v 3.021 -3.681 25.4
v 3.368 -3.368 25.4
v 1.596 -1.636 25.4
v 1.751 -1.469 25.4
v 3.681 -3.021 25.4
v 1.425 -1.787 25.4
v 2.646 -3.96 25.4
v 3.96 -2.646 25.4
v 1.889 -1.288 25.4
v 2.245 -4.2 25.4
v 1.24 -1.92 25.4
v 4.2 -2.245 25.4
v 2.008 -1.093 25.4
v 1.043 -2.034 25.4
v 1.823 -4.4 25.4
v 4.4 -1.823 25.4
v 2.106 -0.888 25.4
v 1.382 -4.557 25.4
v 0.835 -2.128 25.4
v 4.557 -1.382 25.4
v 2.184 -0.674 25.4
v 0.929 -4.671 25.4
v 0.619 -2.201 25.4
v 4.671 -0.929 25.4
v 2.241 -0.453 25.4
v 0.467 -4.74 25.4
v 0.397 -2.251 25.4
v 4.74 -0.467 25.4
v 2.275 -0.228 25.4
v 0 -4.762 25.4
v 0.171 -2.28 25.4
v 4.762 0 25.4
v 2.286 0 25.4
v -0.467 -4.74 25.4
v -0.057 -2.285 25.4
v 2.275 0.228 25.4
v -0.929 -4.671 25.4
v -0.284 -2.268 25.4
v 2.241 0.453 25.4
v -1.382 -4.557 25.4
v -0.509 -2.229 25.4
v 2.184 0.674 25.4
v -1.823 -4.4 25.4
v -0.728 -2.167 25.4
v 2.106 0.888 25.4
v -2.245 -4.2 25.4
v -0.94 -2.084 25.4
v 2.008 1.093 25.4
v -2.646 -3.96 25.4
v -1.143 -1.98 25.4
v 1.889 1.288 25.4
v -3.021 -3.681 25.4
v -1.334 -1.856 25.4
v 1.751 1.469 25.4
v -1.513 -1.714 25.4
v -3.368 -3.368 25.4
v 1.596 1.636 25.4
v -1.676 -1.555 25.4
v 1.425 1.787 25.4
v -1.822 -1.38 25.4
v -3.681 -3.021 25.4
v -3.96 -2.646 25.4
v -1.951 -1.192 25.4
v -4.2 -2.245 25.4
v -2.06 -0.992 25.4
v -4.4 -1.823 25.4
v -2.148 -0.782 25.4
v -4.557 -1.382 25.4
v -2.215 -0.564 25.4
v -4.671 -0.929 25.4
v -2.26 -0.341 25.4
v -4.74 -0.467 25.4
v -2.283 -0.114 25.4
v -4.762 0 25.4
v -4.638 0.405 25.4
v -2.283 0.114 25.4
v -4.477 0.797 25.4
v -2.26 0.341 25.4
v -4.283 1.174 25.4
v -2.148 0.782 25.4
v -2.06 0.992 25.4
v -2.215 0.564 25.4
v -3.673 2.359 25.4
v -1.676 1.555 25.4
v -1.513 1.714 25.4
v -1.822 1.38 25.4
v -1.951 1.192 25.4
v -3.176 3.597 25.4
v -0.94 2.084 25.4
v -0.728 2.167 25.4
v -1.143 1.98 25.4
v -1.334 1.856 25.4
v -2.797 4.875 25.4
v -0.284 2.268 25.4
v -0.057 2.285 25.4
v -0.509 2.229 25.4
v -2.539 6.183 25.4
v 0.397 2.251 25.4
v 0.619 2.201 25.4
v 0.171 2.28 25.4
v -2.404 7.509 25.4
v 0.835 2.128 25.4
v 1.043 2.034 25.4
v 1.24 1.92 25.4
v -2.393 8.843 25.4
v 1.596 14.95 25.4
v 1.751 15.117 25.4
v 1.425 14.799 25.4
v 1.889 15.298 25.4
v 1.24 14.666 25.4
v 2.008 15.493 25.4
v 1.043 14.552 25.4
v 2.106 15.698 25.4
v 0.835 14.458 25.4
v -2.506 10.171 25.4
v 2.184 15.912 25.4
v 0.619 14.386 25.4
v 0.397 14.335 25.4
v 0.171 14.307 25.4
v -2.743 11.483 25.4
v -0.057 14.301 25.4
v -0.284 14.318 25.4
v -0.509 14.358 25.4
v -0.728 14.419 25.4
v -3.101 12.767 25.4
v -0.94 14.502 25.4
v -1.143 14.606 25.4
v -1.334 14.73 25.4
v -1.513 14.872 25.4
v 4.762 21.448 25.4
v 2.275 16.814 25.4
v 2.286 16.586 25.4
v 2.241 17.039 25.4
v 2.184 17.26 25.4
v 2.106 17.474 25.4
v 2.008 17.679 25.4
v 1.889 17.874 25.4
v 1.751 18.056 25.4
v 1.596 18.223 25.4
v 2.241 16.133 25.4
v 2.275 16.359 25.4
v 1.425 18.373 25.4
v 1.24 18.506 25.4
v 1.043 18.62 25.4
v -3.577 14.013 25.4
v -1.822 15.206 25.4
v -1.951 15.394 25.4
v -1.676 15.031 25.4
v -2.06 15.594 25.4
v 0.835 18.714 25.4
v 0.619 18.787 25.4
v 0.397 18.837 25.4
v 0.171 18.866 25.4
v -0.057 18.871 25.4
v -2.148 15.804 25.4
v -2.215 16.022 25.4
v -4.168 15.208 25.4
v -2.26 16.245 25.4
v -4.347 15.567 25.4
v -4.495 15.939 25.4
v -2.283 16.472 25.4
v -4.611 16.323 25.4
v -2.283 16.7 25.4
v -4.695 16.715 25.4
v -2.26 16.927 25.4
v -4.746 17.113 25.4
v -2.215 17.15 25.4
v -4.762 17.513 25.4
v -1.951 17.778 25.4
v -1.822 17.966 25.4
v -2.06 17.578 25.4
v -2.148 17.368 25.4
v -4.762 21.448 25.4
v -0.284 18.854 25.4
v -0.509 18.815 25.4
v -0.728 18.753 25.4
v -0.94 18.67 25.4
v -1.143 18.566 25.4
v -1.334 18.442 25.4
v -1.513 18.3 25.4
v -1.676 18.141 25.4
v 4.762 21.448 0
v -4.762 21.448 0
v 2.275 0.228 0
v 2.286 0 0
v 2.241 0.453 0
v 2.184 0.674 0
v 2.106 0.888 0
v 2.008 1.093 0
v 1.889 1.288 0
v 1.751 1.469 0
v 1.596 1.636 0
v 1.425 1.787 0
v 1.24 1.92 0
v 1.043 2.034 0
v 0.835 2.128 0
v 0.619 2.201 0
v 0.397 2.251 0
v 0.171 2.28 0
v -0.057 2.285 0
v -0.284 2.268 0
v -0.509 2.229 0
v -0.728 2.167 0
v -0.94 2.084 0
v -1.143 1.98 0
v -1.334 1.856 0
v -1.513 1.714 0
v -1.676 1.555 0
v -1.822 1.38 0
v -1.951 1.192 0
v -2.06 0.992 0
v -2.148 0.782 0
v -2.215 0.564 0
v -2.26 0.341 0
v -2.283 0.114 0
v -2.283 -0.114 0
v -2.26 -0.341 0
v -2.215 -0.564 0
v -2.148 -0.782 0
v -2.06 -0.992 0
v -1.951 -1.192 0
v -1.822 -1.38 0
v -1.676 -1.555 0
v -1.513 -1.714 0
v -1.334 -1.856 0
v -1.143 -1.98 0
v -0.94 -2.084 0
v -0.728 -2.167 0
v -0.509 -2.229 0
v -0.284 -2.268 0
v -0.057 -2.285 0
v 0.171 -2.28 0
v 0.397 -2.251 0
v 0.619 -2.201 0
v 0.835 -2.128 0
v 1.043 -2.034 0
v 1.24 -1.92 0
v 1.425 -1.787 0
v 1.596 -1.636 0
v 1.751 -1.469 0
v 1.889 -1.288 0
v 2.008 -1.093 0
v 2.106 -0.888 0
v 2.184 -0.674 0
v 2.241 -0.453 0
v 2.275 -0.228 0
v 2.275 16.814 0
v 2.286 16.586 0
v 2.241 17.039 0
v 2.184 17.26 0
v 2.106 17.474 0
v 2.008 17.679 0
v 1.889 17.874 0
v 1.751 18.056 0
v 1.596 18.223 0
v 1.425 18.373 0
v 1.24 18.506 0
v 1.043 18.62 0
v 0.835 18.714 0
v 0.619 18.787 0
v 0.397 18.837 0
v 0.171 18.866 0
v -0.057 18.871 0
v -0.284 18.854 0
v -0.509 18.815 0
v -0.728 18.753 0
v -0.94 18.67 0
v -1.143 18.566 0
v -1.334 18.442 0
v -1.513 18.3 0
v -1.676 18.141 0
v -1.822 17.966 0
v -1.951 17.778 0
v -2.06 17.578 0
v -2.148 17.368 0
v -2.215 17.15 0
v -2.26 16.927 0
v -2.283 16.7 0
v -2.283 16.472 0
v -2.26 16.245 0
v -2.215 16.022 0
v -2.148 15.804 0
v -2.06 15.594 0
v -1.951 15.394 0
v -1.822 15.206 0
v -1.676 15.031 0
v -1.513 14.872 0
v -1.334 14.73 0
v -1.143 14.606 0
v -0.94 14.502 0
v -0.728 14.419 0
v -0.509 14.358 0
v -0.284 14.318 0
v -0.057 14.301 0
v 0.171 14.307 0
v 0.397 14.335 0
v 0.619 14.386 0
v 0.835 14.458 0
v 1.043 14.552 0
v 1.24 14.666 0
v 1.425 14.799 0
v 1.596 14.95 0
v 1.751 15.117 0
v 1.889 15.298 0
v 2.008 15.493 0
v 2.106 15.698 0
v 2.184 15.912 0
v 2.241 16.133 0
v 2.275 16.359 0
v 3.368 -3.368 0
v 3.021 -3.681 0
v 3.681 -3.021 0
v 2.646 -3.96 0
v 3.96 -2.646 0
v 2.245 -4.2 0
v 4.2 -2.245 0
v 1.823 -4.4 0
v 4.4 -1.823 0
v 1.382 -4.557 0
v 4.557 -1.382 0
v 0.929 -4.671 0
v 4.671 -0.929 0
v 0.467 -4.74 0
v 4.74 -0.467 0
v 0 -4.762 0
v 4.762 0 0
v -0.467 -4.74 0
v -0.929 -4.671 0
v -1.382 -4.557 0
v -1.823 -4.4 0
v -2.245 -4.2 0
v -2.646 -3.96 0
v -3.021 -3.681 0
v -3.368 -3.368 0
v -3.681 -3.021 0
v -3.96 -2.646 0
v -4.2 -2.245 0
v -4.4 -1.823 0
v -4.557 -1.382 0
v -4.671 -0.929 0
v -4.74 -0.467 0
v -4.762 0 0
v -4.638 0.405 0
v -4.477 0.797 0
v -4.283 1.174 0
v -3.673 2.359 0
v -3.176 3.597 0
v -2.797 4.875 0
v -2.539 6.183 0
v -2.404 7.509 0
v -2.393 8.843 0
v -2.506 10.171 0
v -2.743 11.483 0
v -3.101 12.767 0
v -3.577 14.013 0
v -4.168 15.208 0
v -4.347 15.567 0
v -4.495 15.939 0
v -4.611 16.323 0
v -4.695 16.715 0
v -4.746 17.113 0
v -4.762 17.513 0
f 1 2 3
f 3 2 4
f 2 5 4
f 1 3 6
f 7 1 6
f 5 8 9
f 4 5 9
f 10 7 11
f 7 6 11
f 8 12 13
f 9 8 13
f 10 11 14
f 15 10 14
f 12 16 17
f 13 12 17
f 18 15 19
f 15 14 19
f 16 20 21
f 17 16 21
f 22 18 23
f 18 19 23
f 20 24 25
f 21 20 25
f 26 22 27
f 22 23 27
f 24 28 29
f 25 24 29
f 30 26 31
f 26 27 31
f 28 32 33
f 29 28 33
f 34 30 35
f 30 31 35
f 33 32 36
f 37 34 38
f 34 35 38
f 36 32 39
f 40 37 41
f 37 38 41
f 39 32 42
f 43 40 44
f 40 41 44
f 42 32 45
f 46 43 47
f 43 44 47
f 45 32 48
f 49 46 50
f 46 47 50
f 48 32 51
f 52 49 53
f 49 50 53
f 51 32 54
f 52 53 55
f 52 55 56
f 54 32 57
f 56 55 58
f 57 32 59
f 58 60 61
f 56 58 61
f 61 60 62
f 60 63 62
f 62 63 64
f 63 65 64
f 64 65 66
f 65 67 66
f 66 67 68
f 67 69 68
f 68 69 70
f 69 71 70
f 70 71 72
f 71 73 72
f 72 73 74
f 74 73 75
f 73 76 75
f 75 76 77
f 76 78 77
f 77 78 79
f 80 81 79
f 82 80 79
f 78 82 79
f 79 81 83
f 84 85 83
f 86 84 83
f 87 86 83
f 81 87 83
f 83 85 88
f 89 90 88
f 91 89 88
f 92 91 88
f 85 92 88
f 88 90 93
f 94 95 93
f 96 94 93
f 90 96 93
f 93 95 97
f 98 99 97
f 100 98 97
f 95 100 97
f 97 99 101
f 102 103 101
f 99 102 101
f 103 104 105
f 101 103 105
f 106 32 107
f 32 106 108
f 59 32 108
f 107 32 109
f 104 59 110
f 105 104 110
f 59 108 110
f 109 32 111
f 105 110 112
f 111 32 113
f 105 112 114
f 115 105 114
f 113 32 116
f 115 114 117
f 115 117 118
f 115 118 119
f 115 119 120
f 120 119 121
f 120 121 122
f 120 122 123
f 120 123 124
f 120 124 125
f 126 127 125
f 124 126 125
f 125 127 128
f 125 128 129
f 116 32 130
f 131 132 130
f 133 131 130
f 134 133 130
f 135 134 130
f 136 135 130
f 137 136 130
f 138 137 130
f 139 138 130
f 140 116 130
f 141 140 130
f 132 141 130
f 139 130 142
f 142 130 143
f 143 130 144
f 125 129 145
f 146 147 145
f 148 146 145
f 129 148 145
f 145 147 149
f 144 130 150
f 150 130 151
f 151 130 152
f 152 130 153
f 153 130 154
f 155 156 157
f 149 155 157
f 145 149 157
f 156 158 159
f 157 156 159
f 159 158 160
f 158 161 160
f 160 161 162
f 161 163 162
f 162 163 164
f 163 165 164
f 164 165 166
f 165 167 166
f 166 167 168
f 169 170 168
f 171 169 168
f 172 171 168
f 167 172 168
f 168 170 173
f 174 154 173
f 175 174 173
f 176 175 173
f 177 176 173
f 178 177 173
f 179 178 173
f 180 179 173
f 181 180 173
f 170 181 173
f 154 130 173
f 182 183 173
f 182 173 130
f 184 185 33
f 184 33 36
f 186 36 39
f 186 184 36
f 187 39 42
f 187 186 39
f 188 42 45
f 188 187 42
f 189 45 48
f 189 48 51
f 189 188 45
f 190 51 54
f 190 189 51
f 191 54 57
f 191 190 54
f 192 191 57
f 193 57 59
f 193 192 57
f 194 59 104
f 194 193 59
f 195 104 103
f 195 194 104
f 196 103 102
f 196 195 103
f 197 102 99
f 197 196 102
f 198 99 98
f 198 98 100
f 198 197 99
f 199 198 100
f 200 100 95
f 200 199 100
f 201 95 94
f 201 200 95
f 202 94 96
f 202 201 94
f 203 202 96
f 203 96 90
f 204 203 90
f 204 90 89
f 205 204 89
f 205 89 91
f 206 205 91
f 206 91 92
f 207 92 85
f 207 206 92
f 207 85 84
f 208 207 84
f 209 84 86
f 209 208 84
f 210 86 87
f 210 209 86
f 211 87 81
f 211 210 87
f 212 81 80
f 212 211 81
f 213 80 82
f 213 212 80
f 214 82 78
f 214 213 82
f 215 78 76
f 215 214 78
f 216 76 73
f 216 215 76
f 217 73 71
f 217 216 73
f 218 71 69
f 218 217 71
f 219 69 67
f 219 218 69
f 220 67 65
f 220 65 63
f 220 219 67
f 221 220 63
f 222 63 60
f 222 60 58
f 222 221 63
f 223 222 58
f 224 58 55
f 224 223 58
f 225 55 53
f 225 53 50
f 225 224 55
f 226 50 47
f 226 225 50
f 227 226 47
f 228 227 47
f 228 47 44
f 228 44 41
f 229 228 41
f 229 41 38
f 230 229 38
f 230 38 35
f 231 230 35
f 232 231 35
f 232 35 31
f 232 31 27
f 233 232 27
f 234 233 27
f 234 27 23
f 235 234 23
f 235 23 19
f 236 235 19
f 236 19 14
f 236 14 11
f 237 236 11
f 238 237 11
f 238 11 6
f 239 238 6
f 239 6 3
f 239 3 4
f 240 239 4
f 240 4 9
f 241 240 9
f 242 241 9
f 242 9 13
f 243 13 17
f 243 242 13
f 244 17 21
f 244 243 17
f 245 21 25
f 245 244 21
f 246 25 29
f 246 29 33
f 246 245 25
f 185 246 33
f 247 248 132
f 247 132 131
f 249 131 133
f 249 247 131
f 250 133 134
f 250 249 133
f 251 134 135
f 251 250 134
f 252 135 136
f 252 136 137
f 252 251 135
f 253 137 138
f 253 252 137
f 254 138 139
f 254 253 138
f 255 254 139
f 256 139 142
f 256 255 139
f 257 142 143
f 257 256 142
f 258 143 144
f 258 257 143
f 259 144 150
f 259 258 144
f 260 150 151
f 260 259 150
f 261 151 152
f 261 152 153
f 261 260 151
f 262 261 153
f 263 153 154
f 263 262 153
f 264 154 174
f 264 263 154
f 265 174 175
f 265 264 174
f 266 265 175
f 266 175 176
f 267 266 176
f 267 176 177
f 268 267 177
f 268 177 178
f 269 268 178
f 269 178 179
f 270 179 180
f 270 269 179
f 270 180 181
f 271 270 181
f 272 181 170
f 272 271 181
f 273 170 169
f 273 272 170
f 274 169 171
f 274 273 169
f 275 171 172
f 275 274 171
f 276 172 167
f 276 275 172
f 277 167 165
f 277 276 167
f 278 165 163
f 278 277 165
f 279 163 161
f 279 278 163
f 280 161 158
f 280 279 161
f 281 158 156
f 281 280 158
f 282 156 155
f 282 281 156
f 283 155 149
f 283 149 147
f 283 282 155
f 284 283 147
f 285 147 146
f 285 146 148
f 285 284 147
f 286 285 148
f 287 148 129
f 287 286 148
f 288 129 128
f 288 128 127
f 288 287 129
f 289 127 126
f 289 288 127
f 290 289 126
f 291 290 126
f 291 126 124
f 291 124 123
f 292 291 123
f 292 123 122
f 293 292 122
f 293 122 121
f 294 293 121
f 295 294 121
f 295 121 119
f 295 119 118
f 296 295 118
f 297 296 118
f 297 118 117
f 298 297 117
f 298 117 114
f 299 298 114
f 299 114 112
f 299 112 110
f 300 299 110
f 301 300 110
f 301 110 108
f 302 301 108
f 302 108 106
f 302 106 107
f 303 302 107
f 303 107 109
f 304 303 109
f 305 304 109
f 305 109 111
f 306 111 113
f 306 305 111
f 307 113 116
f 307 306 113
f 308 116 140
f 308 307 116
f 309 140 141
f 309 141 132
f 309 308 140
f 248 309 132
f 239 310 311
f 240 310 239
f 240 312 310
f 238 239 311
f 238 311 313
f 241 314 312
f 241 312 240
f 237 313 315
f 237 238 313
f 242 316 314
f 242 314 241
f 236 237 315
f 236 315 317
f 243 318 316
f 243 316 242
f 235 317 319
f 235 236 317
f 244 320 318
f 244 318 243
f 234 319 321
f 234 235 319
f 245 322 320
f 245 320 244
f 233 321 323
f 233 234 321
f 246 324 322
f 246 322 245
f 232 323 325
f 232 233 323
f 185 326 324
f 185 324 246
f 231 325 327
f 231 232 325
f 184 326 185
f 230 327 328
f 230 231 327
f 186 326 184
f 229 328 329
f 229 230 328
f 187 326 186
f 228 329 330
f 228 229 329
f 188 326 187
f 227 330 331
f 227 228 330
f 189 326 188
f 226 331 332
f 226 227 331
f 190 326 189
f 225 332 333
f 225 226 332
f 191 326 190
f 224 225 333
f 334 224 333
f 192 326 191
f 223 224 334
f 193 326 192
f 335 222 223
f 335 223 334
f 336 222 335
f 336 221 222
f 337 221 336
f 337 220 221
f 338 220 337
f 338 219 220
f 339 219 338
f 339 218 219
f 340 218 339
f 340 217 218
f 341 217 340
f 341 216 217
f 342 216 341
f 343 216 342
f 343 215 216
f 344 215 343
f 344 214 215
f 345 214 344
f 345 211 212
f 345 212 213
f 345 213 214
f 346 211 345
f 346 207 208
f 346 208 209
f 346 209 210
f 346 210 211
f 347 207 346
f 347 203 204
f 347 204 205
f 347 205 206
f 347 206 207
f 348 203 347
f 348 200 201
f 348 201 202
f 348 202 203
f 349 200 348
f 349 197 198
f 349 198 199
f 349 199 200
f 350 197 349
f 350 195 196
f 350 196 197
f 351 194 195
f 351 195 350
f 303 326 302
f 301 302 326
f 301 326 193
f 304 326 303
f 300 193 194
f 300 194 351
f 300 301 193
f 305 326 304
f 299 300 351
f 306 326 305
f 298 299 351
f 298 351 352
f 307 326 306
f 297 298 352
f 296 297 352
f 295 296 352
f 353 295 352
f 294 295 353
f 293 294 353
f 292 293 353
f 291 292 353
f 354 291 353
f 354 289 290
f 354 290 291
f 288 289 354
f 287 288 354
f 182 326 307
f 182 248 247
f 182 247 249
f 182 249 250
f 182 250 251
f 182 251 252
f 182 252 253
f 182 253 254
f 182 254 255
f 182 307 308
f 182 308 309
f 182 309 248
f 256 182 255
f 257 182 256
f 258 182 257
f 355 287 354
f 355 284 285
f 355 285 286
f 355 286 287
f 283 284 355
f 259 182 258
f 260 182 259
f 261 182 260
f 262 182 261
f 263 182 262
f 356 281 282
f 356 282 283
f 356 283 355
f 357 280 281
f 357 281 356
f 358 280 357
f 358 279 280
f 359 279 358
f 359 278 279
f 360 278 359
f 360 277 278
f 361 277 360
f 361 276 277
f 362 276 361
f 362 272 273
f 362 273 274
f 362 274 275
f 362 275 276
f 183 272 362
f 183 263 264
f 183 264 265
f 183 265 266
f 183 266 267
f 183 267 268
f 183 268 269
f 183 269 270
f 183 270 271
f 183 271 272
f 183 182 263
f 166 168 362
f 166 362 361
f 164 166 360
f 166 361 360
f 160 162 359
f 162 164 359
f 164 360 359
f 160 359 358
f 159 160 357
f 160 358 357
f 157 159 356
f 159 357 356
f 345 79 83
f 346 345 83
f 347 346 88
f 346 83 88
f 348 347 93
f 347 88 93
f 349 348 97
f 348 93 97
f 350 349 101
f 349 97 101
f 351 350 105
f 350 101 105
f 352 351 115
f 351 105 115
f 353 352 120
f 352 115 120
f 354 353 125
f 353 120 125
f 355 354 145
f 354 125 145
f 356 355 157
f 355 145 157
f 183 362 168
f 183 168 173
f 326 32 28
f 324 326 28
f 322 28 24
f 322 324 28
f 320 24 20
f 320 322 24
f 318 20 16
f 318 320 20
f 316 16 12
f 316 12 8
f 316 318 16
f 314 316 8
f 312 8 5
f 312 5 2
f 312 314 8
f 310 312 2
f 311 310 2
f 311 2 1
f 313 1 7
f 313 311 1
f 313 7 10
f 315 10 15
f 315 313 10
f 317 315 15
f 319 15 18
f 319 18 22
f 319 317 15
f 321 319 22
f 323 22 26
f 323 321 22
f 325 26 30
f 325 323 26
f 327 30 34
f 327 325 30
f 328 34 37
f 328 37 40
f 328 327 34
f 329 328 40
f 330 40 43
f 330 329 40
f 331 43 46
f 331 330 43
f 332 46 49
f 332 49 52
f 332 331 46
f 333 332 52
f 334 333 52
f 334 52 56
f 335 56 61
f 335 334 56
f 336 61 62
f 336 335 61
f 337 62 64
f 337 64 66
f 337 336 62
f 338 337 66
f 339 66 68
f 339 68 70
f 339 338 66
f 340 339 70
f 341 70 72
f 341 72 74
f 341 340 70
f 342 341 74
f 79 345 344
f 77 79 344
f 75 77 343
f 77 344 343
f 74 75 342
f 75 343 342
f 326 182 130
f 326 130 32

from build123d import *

# Parameters (mm, degrees)
SKETCH1_R           = 2.286
BOSS_EXTRUDE1_DEPTH = 25.4
SKETCH2_R           = 14.2875
CUT_EXTRUDE1_DEPTH  = 34.583444905
FILLET1_R           = 4.7625


with BuildPart() as part:
    # Sketch1 → Boss-Extrude1 (new body)
    with BuildSketch(Plane.XY):
        with BuildLine():
            Line((4.7625, 16.5862), (4.7625, 0))
            ThreePointArc((4.7625, 0), (0, -4.7625), (-4.7625, 0))
            Line((-4.7625, 0), (-4.7625, 16.5862))
            Line((-4.7625, 16.5862), (-4.7625, 21.447758984))
            Line((-4.7625, 21.447758984), (4.7625, 21.447758984))
            Line((4.7625, 21.447758984), (4.7625, 16.5862))
        make_face()
        Circle(SKETCH1_R, mode=Mode.SUBTRACT)
        with Locations((0, 16.5862)):
            Circle(SKETCH1_R, mode=Mode.SUBTRACT)
    extrude(amount=BOSS_EXTRUDE1_DEPTH)

    # Sketch2 → Cut-Extrude1 (cut, through all)
    with BuildSketch(Plane.XY.offset(25.4)):
        with Locations((-16.67002, 8.2931)):
            Circle(SKETCH2_R)
    extrude(amount=-CUT_EXTRUDE1_DEPTH, mode=Mode.SUBTRACT)

    # Fillet1
    # the kernel refuses this fillet: 4.7625 mm, written as the material it takes off along each edge
    with BuildSketch(Plane(origin=(-4.7625, 0.397302149, -2.281929285), x_dir=(0.5257327344691161, 0.8506498056824712, 0), z_dir=(0, 0, 1))) as fillet1_piece_1:
        with BuildLine():
            CenterArc((1.064900333, -4.760069656), FILLET1_R, 91.830511452, 15.300937173)
            Line((-0.337964996, -0.208874745), (-0.366022303, -0.117850847))
            ThreePointArc((-0.366022303, -0.117850847), (-0.219058541, -0.023412979), (-0.050076043, 0.081024394))
            Line((-0.050076043, 0.081024394), (0.003042572, 0.095201393))
            ThreePointArc((0.003042572, 0.095201393), (0.456385857, 0.087958969), (0.909729142, 0.095201393))
            Line((0.909729142, 0.095201393), (0.912771714, 0))
        make_face()
    extrude(amount=29.963858571, mode=Mode.SUBTRACT)
    with BuildSketch(Plane(origin=(-4.7625, 16.188897851, -3.311119953), x_dir=(0, 1, 0), z_dir=(0, 0, 1))) as fillet1_piece_2:
        with BuildLine():
            CenterArc((1.324447981, -4.7625), FILLET1_R, 90, 28.947133413)
            Line((-0.980613477, -0.594995), (-1.026714706, -0.5116449))
            ThreePointArc((-1.026714706, -0.5116449), (-0.533743292, -0.225909554), (-0.052638652, 0.079383467))
            Line((-0.052638652, 0.079383467), (0, 0.09525))
            Line((0, 0.09525), (1.324447981, 0.09525))
            Line((1.324447981, 0.09525), (1.324447981, 0))
        make_face()
    extrude(amount=32.022239906, mode=Mode.SUBTRACT)


solid = part.part
